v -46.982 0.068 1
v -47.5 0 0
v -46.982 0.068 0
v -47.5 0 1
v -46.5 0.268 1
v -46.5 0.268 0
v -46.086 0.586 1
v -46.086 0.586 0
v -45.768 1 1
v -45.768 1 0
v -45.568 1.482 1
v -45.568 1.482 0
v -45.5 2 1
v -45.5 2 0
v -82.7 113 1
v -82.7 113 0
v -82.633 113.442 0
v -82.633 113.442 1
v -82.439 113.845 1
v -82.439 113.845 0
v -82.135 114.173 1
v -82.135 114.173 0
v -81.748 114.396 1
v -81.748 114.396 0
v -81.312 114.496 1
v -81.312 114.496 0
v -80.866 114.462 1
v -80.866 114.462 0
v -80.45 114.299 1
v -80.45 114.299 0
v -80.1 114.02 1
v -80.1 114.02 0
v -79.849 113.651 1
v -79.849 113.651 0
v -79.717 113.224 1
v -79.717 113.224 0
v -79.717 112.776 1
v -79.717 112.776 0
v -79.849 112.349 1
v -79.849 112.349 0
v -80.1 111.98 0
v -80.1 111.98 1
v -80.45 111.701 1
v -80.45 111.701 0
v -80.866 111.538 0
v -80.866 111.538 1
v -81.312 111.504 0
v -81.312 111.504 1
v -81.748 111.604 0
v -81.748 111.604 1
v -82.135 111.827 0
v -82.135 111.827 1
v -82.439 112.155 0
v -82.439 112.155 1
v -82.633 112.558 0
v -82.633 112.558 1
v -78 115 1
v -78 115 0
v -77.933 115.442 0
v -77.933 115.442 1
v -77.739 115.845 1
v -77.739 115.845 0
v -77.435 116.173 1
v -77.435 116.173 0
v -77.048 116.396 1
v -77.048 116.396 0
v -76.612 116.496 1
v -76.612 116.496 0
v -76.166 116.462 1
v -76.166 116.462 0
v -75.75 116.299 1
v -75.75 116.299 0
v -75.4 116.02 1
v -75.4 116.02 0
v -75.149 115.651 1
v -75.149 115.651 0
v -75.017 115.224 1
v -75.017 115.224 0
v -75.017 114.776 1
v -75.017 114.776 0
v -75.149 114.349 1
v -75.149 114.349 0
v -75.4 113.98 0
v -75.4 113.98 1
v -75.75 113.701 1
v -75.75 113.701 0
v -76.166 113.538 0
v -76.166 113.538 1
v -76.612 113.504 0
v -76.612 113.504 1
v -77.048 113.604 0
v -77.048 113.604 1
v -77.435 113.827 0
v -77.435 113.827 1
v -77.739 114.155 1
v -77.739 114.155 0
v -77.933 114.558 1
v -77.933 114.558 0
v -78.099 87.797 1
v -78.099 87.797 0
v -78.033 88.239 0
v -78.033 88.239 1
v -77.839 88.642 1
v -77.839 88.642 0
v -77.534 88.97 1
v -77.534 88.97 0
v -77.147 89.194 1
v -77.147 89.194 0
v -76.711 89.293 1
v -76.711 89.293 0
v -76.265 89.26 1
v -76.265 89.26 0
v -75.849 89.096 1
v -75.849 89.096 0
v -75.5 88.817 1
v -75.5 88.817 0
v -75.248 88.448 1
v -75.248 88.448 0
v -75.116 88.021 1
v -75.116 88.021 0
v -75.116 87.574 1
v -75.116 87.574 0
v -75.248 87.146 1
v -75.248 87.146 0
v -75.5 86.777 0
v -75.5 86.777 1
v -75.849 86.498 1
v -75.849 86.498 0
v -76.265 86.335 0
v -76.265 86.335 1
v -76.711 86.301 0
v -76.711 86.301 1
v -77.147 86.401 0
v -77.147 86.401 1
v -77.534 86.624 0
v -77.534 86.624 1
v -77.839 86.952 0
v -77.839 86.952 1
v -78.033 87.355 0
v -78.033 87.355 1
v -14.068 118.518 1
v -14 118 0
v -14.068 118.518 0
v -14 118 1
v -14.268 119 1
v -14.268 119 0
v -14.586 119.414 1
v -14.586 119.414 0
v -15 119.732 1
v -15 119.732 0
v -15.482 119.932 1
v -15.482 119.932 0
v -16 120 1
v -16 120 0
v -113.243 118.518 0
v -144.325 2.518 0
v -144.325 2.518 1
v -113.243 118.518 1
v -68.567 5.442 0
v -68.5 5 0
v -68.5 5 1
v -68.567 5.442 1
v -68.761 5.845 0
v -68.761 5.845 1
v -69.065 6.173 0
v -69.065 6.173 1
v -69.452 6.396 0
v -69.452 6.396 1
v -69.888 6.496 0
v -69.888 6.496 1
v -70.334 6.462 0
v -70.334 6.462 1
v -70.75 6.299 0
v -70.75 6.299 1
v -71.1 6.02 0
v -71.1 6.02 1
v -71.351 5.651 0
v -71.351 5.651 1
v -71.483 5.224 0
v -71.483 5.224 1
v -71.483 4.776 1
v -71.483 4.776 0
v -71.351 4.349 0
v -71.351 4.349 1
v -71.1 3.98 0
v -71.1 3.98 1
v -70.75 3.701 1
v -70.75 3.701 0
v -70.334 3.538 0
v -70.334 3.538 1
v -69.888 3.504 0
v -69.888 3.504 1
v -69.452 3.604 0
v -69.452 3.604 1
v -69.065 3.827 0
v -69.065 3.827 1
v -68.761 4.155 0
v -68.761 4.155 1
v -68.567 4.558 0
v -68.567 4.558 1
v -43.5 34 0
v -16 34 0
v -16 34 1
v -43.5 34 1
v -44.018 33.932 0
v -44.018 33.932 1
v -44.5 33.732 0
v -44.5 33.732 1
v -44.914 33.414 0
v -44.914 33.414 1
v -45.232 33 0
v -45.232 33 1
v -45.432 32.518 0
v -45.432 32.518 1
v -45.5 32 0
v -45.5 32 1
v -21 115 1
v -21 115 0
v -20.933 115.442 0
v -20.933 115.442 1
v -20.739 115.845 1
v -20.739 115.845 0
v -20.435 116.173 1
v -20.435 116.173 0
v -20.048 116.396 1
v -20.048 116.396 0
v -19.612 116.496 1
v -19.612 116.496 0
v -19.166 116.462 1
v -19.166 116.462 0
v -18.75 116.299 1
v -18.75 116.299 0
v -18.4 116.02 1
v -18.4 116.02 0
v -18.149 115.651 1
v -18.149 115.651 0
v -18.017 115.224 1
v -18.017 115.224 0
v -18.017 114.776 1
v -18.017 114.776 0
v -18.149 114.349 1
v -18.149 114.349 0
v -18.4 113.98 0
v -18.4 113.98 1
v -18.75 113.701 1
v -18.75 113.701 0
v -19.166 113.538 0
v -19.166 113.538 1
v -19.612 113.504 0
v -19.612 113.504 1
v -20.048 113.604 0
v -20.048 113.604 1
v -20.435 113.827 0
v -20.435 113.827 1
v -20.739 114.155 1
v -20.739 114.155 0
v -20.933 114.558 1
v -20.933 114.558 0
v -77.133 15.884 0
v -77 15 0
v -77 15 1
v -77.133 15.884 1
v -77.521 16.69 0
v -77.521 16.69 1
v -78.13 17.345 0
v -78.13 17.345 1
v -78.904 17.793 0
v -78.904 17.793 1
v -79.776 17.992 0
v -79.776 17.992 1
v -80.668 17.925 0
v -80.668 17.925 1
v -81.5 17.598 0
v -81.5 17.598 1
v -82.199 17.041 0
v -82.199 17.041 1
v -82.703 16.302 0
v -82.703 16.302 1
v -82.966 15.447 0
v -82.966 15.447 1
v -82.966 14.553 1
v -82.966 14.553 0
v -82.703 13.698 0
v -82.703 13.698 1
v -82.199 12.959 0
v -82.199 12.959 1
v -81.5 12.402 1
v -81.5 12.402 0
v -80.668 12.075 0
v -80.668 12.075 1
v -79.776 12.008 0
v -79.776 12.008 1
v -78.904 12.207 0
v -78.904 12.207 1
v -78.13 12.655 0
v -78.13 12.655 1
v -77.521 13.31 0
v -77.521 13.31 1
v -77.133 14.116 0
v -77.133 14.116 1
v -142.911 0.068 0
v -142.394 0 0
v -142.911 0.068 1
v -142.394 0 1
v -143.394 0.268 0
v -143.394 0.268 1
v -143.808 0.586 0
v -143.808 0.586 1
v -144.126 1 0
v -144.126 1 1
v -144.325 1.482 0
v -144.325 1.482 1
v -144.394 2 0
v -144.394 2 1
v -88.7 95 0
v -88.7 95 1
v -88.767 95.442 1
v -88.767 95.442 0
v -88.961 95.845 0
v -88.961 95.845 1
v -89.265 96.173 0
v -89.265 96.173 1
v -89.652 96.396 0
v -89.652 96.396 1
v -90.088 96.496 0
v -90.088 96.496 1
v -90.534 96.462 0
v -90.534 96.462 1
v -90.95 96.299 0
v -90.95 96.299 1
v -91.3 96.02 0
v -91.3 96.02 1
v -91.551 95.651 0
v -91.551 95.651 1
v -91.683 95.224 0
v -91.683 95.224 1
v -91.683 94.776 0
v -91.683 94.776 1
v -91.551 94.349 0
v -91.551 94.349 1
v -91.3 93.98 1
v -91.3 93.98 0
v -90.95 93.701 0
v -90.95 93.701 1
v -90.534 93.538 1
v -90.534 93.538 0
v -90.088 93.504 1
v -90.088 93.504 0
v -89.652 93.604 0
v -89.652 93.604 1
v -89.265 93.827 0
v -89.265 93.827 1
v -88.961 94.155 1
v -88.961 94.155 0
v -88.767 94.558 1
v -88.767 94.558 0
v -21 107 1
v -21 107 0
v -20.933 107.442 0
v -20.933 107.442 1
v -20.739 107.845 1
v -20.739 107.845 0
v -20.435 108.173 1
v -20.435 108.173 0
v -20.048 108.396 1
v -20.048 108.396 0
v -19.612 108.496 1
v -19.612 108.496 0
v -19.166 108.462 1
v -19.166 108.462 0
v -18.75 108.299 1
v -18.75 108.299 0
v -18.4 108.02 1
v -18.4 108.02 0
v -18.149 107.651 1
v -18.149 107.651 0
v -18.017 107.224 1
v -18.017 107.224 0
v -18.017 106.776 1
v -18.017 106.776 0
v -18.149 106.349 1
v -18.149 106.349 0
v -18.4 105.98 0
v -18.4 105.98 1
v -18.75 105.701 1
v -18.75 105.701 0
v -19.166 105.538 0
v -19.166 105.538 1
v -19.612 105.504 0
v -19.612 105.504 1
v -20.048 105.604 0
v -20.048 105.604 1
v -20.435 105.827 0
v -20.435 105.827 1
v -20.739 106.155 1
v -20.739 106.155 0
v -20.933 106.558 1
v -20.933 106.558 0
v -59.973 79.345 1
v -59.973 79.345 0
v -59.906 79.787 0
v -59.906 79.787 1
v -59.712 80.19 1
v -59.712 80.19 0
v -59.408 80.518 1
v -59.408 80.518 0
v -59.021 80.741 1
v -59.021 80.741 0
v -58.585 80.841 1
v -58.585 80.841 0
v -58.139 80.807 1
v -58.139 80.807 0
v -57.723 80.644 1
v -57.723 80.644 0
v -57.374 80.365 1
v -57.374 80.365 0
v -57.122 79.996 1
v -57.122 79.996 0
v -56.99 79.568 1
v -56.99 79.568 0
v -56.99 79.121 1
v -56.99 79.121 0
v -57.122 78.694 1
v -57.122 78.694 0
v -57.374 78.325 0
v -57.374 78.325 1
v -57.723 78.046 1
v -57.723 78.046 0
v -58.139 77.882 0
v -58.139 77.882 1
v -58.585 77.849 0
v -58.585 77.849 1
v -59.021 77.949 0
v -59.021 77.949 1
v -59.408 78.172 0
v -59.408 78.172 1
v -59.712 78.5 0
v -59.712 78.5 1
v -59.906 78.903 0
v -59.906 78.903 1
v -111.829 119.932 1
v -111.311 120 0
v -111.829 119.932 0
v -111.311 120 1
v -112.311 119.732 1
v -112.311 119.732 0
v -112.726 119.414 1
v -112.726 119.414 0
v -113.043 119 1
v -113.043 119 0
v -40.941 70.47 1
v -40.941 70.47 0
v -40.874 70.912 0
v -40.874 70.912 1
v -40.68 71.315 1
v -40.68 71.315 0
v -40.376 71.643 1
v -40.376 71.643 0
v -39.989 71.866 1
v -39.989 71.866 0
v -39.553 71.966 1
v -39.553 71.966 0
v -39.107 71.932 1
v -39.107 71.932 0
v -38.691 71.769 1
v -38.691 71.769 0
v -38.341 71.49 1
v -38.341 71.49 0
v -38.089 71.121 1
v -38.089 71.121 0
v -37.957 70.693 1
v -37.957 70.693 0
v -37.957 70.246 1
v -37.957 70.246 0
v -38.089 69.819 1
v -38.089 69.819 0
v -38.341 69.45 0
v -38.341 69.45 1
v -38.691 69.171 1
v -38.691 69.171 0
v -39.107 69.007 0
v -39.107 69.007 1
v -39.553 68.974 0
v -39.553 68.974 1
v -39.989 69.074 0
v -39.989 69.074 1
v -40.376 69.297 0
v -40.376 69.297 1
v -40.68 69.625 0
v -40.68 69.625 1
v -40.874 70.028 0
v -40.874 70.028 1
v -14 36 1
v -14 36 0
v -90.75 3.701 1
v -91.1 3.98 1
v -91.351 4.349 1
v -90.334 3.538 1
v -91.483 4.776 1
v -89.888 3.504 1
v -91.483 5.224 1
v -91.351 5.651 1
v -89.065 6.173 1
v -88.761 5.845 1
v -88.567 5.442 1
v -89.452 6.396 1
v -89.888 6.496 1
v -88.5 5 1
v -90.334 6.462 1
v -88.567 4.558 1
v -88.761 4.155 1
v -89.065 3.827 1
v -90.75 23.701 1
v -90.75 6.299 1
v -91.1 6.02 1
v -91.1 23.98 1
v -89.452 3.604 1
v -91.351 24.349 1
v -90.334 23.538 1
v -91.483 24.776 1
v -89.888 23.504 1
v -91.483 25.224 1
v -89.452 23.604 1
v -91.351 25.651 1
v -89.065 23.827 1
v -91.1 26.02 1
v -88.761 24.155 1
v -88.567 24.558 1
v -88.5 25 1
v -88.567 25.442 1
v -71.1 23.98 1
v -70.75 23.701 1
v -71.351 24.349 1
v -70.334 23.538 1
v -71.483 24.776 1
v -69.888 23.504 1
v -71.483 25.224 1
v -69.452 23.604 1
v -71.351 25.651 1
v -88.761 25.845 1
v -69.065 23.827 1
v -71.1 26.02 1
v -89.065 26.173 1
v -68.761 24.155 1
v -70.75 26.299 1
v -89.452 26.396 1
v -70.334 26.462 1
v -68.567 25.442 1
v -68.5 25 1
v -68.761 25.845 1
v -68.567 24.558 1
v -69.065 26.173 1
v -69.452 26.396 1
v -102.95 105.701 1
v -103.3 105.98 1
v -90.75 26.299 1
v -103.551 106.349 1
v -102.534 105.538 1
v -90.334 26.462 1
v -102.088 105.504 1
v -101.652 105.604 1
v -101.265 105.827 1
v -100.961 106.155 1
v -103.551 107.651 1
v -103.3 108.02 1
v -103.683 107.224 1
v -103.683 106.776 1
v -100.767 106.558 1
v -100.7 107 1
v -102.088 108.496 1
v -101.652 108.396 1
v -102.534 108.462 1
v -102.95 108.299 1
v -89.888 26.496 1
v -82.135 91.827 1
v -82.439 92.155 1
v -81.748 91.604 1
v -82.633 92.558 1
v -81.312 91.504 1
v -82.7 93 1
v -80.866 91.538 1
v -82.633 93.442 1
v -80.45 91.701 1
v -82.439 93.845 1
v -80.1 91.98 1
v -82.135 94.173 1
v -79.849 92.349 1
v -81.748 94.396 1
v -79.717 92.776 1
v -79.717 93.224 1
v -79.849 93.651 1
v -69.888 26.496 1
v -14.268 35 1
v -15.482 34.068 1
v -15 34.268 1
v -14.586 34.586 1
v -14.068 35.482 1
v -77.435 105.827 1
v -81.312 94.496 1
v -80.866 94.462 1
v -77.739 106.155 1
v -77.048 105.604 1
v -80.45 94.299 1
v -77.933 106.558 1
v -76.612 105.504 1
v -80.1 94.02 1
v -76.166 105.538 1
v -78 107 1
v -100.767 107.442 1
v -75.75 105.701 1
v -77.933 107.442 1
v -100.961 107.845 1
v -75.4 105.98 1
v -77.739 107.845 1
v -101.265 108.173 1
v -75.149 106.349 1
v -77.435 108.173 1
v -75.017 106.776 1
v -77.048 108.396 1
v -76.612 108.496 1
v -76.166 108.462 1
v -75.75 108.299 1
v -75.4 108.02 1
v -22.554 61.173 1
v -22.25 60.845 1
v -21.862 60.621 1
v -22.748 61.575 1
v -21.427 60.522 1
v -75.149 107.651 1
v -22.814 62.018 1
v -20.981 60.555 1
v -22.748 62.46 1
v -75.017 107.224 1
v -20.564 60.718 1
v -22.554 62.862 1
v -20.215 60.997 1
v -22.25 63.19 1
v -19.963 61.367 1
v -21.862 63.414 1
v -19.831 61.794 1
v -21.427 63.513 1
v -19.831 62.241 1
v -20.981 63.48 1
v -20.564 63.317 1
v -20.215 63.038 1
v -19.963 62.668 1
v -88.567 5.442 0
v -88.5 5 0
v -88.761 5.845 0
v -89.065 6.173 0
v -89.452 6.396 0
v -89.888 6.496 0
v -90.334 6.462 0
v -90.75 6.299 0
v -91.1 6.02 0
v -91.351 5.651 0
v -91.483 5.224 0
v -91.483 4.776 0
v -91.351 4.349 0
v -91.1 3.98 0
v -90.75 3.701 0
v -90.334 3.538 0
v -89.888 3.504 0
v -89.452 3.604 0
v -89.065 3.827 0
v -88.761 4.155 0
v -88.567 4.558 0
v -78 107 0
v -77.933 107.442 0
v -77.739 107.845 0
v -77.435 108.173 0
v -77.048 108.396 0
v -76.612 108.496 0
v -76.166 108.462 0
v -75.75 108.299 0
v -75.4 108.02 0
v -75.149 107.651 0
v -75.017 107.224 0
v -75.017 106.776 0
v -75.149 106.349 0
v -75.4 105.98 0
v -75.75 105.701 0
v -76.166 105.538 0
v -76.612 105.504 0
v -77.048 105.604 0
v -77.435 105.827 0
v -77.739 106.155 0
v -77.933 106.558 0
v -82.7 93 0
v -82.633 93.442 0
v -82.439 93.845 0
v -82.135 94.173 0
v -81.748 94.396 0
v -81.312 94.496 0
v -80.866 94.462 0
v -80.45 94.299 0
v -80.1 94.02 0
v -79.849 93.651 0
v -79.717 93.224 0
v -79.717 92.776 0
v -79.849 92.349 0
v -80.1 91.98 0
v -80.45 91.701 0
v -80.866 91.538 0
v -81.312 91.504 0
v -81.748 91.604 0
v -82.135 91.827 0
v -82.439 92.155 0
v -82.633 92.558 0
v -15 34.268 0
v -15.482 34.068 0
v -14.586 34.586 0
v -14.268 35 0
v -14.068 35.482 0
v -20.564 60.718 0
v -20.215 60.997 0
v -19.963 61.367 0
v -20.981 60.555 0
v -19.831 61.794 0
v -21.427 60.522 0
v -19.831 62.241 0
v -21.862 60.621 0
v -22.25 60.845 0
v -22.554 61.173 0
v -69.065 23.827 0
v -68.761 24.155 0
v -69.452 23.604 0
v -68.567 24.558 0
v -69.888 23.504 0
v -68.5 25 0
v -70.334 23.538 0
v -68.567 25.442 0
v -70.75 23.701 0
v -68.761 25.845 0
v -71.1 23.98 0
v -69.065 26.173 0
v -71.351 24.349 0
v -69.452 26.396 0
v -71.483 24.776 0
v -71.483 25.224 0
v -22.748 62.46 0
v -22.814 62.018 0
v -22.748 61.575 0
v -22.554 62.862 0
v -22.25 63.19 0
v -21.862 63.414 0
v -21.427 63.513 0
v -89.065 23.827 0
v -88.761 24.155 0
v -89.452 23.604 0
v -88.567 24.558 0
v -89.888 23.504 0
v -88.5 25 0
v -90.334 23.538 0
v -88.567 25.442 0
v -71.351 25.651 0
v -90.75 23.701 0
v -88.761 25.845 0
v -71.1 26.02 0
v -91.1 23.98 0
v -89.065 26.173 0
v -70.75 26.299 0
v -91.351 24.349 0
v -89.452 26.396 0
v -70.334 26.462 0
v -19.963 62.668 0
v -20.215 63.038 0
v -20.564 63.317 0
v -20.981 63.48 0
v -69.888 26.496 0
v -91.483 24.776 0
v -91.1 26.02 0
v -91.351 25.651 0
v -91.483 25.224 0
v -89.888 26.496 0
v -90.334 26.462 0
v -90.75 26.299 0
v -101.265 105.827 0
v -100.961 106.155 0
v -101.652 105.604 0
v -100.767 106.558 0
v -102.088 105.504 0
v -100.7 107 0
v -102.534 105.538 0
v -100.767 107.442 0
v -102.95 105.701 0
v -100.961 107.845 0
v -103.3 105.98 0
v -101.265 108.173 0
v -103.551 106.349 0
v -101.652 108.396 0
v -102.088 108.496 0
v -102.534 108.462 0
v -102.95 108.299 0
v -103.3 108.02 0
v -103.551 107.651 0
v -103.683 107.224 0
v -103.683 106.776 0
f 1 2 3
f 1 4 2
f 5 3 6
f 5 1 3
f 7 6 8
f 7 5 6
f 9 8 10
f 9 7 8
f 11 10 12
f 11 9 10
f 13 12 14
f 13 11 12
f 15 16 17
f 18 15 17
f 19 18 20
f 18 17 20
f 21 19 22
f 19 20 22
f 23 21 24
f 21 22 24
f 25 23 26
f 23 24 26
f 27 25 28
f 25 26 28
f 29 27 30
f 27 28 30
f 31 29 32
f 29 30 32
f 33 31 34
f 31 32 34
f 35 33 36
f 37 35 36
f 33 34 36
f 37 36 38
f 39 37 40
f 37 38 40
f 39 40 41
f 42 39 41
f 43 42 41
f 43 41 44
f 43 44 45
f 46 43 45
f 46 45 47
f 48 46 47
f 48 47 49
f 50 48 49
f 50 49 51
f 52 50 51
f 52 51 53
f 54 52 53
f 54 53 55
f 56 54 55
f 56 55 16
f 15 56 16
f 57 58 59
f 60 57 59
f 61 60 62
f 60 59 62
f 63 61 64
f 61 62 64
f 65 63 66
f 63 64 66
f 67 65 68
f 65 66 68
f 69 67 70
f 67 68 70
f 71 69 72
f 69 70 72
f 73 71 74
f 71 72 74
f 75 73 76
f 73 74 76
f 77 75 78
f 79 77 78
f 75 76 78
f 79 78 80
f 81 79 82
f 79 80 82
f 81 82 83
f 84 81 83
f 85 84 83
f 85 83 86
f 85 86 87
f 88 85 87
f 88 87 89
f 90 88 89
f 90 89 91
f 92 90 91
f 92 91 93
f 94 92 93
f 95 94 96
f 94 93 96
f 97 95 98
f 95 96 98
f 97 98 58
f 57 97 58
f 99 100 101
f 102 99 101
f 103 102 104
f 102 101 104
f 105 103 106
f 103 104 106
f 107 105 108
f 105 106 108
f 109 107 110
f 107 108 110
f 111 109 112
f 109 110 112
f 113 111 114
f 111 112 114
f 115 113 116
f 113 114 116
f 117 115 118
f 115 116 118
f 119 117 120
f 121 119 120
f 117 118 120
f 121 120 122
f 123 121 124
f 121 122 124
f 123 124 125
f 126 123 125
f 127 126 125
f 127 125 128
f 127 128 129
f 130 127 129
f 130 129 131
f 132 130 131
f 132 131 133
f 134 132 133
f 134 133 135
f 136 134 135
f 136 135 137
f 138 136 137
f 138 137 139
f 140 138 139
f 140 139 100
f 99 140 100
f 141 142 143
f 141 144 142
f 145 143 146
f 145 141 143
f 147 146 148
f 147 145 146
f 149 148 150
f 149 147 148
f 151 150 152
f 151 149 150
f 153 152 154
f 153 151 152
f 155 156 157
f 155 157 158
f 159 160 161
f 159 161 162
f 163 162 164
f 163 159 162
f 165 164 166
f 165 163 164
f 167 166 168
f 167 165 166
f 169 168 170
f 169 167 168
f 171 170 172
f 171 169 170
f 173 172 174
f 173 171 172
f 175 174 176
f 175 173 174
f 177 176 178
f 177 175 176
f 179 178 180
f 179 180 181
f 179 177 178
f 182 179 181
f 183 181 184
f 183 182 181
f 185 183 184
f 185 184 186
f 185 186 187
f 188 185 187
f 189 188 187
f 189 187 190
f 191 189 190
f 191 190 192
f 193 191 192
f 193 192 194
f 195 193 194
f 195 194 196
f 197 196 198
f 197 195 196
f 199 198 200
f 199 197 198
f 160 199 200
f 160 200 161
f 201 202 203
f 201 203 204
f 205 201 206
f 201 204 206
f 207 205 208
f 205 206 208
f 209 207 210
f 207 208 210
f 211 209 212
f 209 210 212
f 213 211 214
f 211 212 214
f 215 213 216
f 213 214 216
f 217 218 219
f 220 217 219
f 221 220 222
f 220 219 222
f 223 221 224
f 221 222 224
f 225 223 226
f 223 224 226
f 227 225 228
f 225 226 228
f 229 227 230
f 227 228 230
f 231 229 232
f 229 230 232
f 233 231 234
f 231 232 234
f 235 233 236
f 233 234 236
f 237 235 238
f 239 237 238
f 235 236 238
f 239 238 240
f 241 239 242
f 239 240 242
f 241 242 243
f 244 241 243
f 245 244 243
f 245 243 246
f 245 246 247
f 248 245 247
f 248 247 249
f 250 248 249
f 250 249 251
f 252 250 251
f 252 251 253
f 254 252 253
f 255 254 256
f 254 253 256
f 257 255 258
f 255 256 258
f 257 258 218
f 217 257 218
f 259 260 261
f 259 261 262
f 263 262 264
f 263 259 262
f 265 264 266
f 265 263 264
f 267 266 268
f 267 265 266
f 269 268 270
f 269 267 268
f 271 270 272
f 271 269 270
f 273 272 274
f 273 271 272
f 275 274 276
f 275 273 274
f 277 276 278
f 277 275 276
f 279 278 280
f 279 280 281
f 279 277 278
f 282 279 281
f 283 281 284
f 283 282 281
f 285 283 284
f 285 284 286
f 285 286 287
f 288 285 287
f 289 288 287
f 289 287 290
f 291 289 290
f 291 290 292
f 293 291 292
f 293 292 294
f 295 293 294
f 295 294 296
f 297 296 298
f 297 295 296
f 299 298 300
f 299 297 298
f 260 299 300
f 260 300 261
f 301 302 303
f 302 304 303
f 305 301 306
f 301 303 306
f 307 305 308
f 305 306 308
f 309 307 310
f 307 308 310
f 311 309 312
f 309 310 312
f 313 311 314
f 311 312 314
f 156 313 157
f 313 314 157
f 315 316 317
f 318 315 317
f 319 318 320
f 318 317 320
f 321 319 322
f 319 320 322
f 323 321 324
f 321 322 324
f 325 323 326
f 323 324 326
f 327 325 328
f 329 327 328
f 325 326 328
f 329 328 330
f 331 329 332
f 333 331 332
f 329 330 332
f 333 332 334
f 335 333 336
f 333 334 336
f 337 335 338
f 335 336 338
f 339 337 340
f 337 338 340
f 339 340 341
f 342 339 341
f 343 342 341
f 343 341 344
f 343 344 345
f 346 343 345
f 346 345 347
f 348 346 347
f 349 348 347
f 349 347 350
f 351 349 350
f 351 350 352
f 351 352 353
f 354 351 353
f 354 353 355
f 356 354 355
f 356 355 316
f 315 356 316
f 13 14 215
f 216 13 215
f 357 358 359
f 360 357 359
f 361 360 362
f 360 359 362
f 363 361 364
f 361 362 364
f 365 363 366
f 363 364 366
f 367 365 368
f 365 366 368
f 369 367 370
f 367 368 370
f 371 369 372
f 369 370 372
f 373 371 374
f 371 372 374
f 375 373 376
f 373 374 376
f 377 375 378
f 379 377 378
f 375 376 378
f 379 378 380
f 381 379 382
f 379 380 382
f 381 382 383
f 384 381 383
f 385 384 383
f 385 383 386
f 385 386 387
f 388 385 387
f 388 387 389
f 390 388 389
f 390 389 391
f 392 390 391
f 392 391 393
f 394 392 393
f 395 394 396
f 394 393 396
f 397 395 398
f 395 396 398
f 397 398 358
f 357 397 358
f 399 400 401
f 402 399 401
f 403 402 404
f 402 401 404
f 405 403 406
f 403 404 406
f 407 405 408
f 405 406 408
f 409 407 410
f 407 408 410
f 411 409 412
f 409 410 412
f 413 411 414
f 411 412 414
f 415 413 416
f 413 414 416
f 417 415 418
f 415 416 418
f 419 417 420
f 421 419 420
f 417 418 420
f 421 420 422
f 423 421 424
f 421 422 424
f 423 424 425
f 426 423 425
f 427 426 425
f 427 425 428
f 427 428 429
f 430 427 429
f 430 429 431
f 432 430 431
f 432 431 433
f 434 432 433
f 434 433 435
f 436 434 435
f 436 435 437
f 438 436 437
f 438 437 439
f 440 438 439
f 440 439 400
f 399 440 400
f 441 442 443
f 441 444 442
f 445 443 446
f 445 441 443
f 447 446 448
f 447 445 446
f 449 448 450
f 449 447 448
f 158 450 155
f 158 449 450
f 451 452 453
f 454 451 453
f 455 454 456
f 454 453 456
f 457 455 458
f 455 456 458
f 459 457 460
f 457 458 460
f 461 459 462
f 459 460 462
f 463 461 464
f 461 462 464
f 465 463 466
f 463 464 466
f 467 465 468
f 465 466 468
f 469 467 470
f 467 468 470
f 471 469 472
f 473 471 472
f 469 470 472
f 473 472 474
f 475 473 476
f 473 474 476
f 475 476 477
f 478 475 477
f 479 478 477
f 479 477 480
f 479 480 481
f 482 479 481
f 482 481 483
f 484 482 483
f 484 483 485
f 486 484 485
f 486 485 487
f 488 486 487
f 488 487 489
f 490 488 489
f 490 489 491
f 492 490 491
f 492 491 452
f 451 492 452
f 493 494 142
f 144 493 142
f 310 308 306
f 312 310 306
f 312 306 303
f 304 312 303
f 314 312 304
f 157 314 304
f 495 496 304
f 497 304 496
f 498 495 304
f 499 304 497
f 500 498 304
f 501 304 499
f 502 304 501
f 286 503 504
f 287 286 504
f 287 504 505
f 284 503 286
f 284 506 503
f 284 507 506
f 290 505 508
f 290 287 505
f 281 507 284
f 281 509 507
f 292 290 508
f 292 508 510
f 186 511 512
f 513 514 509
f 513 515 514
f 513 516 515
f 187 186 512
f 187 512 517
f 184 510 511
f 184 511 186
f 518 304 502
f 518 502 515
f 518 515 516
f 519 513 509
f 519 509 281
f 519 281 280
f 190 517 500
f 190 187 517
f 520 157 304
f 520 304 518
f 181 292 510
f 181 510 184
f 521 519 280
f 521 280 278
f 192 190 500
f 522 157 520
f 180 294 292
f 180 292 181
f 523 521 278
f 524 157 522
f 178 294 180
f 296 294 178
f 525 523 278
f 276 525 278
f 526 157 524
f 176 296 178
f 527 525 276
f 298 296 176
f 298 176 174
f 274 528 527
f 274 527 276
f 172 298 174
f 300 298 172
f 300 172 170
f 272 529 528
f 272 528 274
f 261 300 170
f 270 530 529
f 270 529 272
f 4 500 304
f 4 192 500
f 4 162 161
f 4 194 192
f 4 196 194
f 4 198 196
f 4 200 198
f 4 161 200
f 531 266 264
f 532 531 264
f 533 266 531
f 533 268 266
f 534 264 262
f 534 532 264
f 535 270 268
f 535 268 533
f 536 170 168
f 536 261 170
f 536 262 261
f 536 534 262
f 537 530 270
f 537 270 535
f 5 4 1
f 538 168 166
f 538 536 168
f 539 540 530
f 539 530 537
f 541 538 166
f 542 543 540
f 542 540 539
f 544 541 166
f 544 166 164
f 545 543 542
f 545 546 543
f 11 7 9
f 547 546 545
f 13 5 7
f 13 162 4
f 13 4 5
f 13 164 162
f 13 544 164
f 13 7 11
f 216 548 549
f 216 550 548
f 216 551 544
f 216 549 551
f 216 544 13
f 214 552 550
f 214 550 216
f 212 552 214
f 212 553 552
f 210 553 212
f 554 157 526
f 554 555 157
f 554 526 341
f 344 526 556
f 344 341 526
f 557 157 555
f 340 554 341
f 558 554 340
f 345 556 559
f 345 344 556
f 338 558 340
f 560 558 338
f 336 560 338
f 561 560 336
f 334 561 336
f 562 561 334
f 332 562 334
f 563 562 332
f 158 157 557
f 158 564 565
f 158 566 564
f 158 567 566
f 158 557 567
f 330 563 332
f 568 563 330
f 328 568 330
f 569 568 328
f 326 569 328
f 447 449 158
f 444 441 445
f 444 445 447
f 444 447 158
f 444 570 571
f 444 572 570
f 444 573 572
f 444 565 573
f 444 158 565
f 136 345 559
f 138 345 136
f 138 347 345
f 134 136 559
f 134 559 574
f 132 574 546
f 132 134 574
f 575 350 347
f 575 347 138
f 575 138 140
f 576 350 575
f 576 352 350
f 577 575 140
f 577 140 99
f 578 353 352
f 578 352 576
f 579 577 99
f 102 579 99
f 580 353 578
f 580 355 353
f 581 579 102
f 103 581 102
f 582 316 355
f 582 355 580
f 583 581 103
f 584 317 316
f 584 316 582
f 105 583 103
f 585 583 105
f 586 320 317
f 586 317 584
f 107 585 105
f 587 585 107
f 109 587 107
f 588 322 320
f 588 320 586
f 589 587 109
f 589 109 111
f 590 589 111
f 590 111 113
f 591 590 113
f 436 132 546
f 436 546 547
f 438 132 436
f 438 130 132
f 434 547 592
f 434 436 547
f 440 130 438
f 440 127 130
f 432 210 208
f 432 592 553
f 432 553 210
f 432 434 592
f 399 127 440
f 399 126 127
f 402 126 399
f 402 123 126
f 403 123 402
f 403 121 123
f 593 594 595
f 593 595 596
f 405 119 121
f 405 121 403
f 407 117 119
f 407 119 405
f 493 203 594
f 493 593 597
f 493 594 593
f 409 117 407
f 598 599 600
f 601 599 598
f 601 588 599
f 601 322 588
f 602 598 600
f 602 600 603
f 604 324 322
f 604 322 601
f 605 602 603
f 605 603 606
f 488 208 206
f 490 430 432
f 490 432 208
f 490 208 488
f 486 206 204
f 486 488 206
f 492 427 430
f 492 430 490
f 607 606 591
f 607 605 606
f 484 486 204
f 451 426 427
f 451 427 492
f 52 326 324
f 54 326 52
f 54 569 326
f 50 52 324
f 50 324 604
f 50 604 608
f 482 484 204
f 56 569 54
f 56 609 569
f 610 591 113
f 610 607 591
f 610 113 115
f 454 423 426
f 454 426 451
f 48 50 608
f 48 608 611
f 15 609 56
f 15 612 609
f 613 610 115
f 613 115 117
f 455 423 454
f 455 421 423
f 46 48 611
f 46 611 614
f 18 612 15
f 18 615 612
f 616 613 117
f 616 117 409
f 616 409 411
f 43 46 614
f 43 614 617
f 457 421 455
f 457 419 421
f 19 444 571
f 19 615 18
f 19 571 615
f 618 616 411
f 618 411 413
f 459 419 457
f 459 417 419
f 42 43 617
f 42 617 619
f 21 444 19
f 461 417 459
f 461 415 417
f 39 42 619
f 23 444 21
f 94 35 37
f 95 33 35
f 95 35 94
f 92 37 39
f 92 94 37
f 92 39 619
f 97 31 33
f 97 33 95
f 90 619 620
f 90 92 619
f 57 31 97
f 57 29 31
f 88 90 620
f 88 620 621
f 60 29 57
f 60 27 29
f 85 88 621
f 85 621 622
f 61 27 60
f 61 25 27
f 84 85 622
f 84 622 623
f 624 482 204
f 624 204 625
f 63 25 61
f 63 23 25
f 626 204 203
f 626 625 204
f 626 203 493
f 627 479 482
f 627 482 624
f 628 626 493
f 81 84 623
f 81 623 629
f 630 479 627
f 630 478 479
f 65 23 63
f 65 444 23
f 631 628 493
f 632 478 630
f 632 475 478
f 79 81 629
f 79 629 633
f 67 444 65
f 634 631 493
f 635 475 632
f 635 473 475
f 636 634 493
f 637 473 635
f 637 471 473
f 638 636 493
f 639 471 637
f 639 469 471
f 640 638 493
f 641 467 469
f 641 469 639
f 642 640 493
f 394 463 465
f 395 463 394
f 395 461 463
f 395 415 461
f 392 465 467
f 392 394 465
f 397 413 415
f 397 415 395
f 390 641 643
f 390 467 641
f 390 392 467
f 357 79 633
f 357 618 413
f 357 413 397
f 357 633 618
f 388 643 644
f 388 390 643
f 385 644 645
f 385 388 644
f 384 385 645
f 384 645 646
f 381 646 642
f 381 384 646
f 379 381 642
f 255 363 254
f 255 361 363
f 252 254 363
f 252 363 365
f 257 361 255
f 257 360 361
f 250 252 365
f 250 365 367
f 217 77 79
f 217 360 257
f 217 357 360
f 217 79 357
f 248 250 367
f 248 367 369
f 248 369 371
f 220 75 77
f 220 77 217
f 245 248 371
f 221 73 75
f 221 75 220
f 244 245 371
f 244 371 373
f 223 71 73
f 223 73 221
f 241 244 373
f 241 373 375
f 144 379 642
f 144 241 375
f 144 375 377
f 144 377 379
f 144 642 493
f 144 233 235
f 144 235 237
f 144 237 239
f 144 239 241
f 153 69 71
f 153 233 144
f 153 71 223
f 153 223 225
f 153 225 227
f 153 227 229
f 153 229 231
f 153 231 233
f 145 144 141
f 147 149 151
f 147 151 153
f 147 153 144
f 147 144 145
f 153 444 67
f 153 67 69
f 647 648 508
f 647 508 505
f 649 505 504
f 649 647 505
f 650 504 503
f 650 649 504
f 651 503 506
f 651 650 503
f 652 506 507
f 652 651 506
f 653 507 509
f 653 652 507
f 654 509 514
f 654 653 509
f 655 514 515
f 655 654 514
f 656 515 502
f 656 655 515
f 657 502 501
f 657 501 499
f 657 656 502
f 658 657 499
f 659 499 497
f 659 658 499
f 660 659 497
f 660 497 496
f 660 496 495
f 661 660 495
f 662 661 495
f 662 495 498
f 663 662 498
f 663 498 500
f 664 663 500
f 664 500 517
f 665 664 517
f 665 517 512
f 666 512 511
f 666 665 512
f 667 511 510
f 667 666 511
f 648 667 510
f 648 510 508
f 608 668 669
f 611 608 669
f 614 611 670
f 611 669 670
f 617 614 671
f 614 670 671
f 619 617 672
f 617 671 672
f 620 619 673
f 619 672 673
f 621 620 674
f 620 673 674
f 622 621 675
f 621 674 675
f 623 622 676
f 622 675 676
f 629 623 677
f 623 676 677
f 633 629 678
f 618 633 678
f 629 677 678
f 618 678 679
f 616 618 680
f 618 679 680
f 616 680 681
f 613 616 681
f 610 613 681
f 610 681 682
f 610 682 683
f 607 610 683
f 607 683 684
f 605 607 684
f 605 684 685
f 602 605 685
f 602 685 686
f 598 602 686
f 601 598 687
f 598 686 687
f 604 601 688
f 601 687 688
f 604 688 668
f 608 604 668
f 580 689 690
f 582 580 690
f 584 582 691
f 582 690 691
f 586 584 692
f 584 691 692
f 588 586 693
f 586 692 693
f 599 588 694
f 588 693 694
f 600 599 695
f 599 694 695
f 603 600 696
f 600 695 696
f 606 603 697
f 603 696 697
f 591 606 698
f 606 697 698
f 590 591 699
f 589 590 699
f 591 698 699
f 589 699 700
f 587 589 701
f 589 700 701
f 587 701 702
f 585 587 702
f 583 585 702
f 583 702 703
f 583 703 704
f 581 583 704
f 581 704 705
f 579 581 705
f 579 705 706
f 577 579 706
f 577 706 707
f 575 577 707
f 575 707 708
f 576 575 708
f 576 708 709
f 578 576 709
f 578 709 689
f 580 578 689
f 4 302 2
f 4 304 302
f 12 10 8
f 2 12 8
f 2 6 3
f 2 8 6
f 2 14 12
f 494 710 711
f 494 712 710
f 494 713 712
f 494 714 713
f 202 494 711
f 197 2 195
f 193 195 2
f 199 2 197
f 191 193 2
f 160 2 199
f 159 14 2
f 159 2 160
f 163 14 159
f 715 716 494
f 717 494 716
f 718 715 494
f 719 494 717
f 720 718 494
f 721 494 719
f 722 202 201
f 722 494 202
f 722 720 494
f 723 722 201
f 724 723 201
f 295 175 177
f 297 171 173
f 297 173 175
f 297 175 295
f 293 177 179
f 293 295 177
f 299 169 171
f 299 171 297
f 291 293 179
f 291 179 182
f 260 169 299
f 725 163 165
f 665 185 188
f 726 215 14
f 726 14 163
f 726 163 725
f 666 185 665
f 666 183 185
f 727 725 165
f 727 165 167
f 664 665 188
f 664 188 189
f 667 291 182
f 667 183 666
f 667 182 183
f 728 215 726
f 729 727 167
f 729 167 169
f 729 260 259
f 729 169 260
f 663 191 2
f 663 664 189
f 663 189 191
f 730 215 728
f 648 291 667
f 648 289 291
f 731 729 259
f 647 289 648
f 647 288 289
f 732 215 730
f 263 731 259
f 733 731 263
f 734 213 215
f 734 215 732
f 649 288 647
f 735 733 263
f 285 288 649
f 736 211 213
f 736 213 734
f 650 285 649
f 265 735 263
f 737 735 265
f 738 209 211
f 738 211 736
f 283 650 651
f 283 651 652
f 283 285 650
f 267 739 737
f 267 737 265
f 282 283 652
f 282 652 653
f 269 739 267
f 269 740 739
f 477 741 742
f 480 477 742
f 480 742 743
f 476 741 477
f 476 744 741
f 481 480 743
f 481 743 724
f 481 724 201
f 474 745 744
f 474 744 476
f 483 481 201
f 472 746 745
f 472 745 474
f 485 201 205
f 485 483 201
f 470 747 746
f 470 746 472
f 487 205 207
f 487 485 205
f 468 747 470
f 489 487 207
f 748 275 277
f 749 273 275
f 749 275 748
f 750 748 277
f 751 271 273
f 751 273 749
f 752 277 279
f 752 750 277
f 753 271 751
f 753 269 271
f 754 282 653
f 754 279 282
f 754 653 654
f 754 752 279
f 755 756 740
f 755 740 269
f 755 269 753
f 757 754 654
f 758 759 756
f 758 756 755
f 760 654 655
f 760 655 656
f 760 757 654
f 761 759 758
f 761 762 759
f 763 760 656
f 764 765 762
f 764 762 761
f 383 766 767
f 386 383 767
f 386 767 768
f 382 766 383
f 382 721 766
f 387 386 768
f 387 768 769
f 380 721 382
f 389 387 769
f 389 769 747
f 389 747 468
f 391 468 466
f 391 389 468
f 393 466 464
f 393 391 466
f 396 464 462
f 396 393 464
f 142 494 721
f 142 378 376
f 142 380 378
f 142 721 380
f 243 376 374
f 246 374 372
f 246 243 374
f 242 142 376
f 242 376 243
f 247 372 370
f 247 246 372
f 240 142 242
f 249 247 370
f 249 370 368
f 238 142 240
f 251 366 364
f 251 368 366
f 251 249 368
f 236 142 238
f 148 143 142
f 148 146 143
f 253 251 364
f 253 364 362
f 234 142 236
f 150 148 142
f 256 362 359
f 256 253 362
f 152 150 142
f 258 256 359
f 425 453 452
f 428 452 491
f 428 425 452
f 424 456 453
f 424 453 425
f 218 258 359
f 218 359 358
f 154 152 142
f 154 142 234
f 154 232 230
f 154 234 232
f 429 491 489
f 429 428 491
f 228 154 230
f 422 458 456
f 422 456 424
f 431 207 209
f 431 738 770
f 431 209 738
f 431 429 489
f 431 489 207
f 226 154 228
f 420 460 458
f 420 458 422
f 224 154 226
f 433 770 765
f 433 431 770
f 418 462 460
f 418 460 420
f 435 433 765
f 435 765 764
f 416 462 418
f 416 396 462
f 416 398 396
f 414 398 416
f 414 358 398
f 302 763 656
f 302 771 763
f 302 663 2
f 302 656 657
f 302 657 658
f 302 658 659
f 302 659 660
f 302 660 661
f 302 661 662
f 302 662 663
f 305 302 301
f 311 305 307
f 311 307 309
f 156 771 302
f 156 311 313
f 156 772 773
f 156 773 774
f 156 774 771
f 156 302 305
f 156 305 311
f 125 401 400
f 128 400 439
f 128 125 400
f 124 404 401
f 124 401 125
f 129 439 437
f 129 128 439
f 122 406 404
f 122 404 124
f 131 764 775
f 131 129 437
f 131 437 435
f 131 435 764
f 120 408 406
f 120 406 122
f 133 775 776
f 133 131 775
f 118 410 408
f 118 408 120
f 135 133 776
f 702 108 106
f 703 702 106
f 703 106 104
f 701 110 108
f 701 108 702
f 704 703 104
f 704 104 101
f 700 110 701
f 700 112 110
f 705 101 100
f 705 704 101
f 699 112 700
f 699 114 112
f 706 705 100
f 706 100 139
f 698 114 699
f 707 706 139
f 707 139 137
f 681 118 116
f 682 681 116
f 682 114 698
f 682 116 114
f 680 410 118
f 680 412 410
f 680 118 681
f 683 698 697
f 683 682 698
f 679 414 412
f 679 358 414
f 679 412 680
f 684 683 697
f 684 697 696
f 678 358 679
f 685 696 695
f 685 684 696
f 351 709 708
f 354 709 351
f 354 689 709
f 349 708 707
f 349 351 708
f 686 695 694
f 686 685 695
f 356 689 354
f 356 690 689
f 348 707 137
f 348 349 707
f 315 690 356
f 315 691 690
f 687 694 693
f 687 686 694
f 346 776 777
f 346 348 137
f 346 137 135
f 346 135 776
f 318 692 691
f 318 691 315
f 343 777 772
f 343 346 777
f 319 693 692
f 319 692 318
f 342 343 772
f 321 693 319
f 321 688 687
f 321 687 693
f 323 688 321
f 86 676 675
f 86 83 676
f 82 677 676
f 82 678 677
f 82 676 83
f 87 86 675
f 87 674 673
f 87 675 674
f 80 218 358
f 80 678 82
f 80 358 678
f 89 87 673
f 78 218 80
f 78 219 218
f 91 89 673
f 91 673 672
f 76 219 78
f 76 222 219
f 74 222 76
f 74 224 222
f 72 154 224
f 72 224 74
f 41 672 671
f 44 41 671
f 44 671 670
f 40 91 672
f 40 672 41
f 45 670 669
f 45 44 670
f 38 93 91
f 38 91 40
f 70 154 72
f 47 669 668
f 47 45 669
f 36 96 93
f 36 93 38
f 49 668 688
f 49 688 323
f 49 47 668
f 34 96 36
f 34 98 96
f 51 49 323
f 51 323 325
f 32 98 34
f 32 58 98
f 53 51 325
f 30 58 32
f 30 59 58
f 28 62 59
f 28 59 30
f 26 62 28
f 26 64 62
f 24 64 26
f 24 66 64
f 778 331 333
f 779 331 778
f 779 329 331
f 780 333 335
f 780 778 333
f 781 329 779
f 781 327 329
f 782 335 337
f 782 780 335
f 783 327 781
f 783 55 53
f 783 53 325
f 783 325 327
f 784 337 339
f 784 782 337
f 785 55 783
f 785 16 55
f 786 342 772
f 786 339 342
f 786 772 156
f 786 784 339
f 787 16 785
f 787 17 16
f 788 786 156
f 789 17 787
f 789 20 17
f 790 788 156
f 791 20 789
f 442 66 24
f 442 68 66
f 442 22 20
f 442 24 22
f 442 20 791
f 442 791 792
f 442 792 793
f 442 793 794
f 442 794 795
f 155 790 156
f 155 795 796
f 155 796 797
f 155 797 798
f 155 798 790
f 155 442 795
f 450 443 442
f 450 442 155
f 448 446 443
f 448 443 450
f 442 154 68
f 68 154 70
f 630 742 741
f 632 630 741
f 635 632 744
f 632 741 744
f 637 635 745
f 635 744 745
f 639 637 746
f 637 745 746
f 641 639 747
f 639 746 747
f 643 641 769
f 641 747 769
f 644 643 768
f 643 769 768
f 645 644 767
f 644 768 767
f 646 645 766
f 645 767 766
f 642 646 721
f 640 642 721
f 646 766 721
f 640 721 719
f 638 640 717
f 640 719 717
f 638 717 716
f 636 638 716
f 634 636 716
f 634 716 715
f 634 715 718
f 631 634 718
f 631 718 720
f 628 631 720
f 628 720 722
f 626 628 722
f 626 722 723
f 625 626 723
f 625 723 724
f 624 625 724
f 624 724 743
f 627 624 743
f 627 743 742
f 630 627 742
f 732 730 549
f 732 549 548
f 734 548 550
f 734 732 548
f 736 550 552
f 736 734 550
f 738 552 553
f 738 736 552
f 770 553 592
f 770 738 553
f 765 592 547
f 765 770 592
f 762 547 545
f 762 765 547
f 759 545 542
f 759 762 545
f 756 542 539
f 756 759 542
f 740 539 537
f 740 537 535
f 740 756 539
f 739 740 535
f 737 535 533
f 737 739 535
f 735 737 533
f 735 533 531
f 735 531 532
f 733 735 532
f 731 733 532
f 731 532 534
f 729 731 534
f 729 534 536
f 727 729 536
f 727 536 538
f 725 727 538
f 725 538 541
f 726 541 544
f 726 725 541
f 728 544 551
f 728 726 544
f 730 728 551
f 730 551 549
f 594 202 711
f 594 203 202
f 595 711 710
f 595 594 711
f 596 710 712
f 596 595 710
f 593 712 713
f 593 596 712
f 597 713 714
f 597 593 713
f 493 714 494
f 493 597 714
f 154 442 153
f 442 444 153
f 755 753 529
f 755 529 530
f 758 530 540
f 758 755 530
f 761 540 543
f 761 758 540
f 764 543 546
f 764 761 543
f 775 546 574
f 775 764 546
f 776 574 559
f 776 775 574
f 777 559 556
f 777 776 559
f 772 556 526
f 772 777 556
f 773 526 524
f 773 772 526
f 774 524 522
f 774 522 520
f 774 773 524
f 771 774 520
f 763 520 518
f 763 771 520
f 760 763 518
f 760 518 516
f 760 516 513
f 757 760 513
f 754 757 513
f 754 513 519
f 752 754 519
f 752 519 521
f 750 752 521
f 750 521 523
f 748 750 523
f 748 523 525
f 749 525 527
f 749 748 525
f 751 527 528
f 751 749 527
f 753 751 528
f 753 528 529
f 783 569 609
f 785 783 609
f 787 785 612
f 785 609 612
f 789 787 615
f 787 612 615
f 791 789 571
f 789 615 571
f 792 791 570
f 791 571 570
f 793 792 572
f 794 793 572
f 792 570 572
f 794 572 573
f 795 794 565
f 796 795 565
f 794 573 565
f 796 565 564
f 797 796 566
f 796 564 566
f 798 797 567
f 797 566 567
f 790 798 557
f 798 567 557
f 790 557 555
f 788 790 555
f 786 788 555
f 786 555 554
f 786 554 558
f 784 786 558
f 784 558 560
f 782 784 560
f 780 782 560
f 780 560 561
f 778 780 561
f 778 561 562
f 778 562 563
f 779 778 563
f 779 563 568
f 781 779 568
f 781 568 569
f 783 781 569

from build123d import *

# Parameters (mm, degrees)
SKETCH_1_R           = 1.5
SKETCH_1_R_2         = 3
EXTRUDE_1_DEPTH      = 1
SKETCH_2_W           = 46.5
SKETCH_2_H           = 120
EXTRUDE_2_DEPTH      = 1
SKETCH_7_R           = 1.5
CUT_EXTRUDE_5_DEPTH  = 10
SKETCH_8_R           = 1.5
CUT_EXTRUDE_6_DEPTH  = 10
SKETCH_10_W          = 51
SKETCH_10_H          = 30
CUT_EXTRUDE_7_DEPTH  = 10
SKETCH_11_R          = 1.5
CUT_EXTRUDE_8_DEPTH  = 65
SKETCH_12_R          = 1.5
CUT_EXTRUDE_9_DEPTH  = 10
SKETCH_13_W          = 41
SKETCH_13_H          = 30
CUT_EXTRUDE_10_DEPTH = 10
SKETCH_14_R          = 10
CUT_EXTRUDE_11_DEPTH = 10
SKETCH_16_R          = 1.5
CUT_EXTRUDE_13_DEPTH = 1
SKETCH_17_R          = 1.5
CUT_EXTRUDE_14_DEPTH = 10
SKETCH_18_W          = 92
SKETCH_18_H          = 4
CUT_EXTRUDE_15_DEPTH = 10
FILLET_2_R           = 2
SKETCH_19_R          = 10
EXTRUDE_3_DEPTH      = 1
SKETCH_20_W          = 60.5
SKETCH_20_H          = 86
CUT_EXTRUDE_16_DEPTH = 10
FILLET_3_R           = 2


with BuildPart() as part:
    # 草图1 → 凸台-拉伸1 (new body)
    with BuildSketch(Plane.XY):
        Polygon((0, 0), (-145, 0), (-112.846096908, 120), (0, 120), align=None)
        with Locations((-70, 25)):
            Circle(SKETCH_1_R, mode=Mode.SUBTRACT)
        with Locations((-90, 25)):
            Circle(SKETCH_1_R, mode=Mode.SUBTRACT)
        with Locations((-80, 15)):
            Circle(SKETCH_1_R_2, mode=Mode.SUBTRACT)
        with Locations((-70, 5)):
            Circle(SKETCH_1_R, mode=Mode.SUBTRACT)
        with Locations((-90, 5)):
            Circle(SKETCH_1_R, mode=Mode.SUBTRACT)
    extrude(amount=EXTRUDE_1_DEPTH)

    # 草图2 → 凸台-拉伸2 (add)
    with BuildSketch(Plane.XY.offset(1)):
        with Locations((23.25, 60)):
            Rectangle(SKETCH_2_W, SKETCH_2_H)
    extrude(amount=-EXTRUDE_2_DEPTH)

    # 草图7 → 切除-拉伸5 (cut)
    with BuildSketch(Plane.XY.offset(1)):
        with Locations((-102.2, 107)):
            Circle(SKETCH_7_R)
        with Locations((-90.2, 95)):
            Circle(SKETCH_7_R)
    extrude(amount=-CUT_EXTRUDE_5_DEPTH, mode=Mode.SUBTRACT)

    # 草图8 → 切除-拉伸6 (cut)
    with BuildSketch(Plane.XY.offset(1)):
        with Locations((42.5, 103)):
            Circle(SKETCH_8_R)
        with Locations((42.5, 83)):
            Circle(SKETCH_8_R)
    extrude(amount=-CUT_EXTRUDE_6_DEPTH, mode=Mode.SUBTRACT)

    # 草图10 → 切除-拉伸7 (cut)
    with BuildSketch(Plane.XY.offset(1)):
        with Locations((21, 15)):
            Rectangle(SKETCH_10_W, SKETCH_10_H)
    extrude(amount=-CUT_EXTRUDE_7_DEPTH, mode=Mode.SUBTRACT)

    # 草图11 → 切除-拉伸8 (cut)
    with BuildSketch(Plane(origin=(0, 0, 0), x_dir=(-1, 0, 0), z_dir=(0, 0, -1))):
        with Locations((76.599239768, 87.797222746)):
            Circle(SKETCH_11_R)
        with Locations((58.473084028, 79.344857511)):
            Circle(SKETCH_11_R)
        with Locations((21.314464759, 62.017508779)):
            Circle(SKETCH_11_R)
        with Locations((39.4406205, 70.469874014)):
            Circle(SKETCH_11_R)
    extrude(amount=-CUT_EXTRUDE_8_DEPTH, mode=Mode.SUBTRACT)

    # 草图12 → 切除-拉伸9 (cut)
    with BuildSketch(Plane(origin=(0, 0, 0), x_dir=(-1, 0, 0), z_dir=(0, 0, -1))):
        with Locations((81.2, 113)):
            Circle(SKETCH_12_R)
        with Locations((81.2, 93)):
            Circle(SKETCH_12_R)
    extrude(amount=-CUT_EXTRUDE_9_DEPTH, mode=Mode.SUBTRACT)

    # 草图13 → 切除-拉伸10 (cut)
    with BuildSketch(Plane(origin=(0, 0, 0), x_dir=(-1, 0, 0), z_dir=(0, 0, -1))):
        with Locations((25, 15)):
            Rectangle(SKETCH_13_W, SKETCH_13_H)
    extrude(amount=-CUT_EXTRUDE_10_DEPTH, mode=Mode.SUBTRACT)

    # 草图14 → 切除-拉伸11 (cut)
    with BuildSketch(Plane(origin=(0, 0, 0), x_dir=(-1, 0, 0), z_dir=(0, 0, -1))):
        with Locations((-28.5, 104)):
            Circle(SKETCH_14_R)
    extrude(amount=-CUT_EXTRUDE_11_DEPTH, mode=Mode.SUBTRACT)

    # 草图16 → 切除-拉伸13 (cut)
    with BuildSketch(Plane(origin=(0, 0, 0), x_dir=(-1, 0, 0), z_dir=(0, 0, -1))):
        with Locations((76.5, 115)):
            Circle(SKETCH_16_R)
        with Locations((76.5, 107)):
            Circle(SKETCH_16_R)
        with Locations((19.5, 107)):
            Circle(SKETCH_16_R)
        with Locations((19.5, 115)):
            Circle(SKETCH_16_R)
    extrude(amount=-CUT_EXTRUDE_13_DEPTH, mode=Mode.SUBTRACT)

    # 草图17 → 切除-拉伸14 (cut)
    with BuildSketch(Plane(origin=(0, 0, 0), x_dir=(-1, 0, 0), z_dir=(0, 0, -1))):
        with Locations((-14.5, 115)):
            Circle(SKETCH_17_R)
        with Locations((-34.5, 115)):
            Circle(SKETCH_17_R)
    extrude(amount=-CUT_EXTRUDE_14_DEPTH, mode=Mode.SUBTRACT)

    # 草图18 → 切除-拉伸15 (cut)
    with BuildSketch(Plane(origin=(0, 0, 0), x_dir=(-1, 0, 0), z_dir=(0, 0, -1))):
        with Locations((-0.5, 32)):
            Rectangle(SKETCH_18_W, SKETCH_18_H)
    extrude(amount=-CUT_EXTRUDE_15_DEPTH, mode=Mode.SUBTRACT)

    # 圆角2
    fillet_2_edges = [part.edges().sort_by_distance(p)[0] for p in [
        (-45.5, 0, 0.5),
        (46.5, 34, 0.5),
        (-45.5, 34, 0.5),
        (46.5, 120, 0.5),
        (-145, 0, 0.5),
        (-112.846096908, 120, 0.5),
    ]]
    fillet(fillet_2_edges, radius=FILLET_2_R)

    # 草图19 → 凸台-拉伸3 (add)
    with BuildSketch(Plane(origin=(0, 0, 0), x_dir=(-1, 0, 0), z_dir=(0, 0, -1))):
        with Locations((-28.5, 104)):
            Circle(SKETCH_19_R)
    extrude(amount=-EXTRUDE_3_DEPTH)

    # 草图20 → 切除-拉伸16 (cut)
    with BuildSketch(Plane(origin=(0, 0, 0), x_dir=(-1, 0, 0), z_dir=(0, 0, -1))):
        with Locations((-16.25, 77)):
            Rectangle(SKETCH_20_W, SKETCH_20_H)
    extrude(amount=-CUT_EXTRUDE_16_DEPTH, mode=Mode.SUBTRACT)

    # 圆角3
    fillet_3_edges = [part.edges().sort_by_distance(p)[0] for p in [
        (-14, 120, 0.5),
        (-14, 34, 0.5),
    ]]
    fillet(fillet_3_edges, radius=FILLET_3_R)


solid = part.part
